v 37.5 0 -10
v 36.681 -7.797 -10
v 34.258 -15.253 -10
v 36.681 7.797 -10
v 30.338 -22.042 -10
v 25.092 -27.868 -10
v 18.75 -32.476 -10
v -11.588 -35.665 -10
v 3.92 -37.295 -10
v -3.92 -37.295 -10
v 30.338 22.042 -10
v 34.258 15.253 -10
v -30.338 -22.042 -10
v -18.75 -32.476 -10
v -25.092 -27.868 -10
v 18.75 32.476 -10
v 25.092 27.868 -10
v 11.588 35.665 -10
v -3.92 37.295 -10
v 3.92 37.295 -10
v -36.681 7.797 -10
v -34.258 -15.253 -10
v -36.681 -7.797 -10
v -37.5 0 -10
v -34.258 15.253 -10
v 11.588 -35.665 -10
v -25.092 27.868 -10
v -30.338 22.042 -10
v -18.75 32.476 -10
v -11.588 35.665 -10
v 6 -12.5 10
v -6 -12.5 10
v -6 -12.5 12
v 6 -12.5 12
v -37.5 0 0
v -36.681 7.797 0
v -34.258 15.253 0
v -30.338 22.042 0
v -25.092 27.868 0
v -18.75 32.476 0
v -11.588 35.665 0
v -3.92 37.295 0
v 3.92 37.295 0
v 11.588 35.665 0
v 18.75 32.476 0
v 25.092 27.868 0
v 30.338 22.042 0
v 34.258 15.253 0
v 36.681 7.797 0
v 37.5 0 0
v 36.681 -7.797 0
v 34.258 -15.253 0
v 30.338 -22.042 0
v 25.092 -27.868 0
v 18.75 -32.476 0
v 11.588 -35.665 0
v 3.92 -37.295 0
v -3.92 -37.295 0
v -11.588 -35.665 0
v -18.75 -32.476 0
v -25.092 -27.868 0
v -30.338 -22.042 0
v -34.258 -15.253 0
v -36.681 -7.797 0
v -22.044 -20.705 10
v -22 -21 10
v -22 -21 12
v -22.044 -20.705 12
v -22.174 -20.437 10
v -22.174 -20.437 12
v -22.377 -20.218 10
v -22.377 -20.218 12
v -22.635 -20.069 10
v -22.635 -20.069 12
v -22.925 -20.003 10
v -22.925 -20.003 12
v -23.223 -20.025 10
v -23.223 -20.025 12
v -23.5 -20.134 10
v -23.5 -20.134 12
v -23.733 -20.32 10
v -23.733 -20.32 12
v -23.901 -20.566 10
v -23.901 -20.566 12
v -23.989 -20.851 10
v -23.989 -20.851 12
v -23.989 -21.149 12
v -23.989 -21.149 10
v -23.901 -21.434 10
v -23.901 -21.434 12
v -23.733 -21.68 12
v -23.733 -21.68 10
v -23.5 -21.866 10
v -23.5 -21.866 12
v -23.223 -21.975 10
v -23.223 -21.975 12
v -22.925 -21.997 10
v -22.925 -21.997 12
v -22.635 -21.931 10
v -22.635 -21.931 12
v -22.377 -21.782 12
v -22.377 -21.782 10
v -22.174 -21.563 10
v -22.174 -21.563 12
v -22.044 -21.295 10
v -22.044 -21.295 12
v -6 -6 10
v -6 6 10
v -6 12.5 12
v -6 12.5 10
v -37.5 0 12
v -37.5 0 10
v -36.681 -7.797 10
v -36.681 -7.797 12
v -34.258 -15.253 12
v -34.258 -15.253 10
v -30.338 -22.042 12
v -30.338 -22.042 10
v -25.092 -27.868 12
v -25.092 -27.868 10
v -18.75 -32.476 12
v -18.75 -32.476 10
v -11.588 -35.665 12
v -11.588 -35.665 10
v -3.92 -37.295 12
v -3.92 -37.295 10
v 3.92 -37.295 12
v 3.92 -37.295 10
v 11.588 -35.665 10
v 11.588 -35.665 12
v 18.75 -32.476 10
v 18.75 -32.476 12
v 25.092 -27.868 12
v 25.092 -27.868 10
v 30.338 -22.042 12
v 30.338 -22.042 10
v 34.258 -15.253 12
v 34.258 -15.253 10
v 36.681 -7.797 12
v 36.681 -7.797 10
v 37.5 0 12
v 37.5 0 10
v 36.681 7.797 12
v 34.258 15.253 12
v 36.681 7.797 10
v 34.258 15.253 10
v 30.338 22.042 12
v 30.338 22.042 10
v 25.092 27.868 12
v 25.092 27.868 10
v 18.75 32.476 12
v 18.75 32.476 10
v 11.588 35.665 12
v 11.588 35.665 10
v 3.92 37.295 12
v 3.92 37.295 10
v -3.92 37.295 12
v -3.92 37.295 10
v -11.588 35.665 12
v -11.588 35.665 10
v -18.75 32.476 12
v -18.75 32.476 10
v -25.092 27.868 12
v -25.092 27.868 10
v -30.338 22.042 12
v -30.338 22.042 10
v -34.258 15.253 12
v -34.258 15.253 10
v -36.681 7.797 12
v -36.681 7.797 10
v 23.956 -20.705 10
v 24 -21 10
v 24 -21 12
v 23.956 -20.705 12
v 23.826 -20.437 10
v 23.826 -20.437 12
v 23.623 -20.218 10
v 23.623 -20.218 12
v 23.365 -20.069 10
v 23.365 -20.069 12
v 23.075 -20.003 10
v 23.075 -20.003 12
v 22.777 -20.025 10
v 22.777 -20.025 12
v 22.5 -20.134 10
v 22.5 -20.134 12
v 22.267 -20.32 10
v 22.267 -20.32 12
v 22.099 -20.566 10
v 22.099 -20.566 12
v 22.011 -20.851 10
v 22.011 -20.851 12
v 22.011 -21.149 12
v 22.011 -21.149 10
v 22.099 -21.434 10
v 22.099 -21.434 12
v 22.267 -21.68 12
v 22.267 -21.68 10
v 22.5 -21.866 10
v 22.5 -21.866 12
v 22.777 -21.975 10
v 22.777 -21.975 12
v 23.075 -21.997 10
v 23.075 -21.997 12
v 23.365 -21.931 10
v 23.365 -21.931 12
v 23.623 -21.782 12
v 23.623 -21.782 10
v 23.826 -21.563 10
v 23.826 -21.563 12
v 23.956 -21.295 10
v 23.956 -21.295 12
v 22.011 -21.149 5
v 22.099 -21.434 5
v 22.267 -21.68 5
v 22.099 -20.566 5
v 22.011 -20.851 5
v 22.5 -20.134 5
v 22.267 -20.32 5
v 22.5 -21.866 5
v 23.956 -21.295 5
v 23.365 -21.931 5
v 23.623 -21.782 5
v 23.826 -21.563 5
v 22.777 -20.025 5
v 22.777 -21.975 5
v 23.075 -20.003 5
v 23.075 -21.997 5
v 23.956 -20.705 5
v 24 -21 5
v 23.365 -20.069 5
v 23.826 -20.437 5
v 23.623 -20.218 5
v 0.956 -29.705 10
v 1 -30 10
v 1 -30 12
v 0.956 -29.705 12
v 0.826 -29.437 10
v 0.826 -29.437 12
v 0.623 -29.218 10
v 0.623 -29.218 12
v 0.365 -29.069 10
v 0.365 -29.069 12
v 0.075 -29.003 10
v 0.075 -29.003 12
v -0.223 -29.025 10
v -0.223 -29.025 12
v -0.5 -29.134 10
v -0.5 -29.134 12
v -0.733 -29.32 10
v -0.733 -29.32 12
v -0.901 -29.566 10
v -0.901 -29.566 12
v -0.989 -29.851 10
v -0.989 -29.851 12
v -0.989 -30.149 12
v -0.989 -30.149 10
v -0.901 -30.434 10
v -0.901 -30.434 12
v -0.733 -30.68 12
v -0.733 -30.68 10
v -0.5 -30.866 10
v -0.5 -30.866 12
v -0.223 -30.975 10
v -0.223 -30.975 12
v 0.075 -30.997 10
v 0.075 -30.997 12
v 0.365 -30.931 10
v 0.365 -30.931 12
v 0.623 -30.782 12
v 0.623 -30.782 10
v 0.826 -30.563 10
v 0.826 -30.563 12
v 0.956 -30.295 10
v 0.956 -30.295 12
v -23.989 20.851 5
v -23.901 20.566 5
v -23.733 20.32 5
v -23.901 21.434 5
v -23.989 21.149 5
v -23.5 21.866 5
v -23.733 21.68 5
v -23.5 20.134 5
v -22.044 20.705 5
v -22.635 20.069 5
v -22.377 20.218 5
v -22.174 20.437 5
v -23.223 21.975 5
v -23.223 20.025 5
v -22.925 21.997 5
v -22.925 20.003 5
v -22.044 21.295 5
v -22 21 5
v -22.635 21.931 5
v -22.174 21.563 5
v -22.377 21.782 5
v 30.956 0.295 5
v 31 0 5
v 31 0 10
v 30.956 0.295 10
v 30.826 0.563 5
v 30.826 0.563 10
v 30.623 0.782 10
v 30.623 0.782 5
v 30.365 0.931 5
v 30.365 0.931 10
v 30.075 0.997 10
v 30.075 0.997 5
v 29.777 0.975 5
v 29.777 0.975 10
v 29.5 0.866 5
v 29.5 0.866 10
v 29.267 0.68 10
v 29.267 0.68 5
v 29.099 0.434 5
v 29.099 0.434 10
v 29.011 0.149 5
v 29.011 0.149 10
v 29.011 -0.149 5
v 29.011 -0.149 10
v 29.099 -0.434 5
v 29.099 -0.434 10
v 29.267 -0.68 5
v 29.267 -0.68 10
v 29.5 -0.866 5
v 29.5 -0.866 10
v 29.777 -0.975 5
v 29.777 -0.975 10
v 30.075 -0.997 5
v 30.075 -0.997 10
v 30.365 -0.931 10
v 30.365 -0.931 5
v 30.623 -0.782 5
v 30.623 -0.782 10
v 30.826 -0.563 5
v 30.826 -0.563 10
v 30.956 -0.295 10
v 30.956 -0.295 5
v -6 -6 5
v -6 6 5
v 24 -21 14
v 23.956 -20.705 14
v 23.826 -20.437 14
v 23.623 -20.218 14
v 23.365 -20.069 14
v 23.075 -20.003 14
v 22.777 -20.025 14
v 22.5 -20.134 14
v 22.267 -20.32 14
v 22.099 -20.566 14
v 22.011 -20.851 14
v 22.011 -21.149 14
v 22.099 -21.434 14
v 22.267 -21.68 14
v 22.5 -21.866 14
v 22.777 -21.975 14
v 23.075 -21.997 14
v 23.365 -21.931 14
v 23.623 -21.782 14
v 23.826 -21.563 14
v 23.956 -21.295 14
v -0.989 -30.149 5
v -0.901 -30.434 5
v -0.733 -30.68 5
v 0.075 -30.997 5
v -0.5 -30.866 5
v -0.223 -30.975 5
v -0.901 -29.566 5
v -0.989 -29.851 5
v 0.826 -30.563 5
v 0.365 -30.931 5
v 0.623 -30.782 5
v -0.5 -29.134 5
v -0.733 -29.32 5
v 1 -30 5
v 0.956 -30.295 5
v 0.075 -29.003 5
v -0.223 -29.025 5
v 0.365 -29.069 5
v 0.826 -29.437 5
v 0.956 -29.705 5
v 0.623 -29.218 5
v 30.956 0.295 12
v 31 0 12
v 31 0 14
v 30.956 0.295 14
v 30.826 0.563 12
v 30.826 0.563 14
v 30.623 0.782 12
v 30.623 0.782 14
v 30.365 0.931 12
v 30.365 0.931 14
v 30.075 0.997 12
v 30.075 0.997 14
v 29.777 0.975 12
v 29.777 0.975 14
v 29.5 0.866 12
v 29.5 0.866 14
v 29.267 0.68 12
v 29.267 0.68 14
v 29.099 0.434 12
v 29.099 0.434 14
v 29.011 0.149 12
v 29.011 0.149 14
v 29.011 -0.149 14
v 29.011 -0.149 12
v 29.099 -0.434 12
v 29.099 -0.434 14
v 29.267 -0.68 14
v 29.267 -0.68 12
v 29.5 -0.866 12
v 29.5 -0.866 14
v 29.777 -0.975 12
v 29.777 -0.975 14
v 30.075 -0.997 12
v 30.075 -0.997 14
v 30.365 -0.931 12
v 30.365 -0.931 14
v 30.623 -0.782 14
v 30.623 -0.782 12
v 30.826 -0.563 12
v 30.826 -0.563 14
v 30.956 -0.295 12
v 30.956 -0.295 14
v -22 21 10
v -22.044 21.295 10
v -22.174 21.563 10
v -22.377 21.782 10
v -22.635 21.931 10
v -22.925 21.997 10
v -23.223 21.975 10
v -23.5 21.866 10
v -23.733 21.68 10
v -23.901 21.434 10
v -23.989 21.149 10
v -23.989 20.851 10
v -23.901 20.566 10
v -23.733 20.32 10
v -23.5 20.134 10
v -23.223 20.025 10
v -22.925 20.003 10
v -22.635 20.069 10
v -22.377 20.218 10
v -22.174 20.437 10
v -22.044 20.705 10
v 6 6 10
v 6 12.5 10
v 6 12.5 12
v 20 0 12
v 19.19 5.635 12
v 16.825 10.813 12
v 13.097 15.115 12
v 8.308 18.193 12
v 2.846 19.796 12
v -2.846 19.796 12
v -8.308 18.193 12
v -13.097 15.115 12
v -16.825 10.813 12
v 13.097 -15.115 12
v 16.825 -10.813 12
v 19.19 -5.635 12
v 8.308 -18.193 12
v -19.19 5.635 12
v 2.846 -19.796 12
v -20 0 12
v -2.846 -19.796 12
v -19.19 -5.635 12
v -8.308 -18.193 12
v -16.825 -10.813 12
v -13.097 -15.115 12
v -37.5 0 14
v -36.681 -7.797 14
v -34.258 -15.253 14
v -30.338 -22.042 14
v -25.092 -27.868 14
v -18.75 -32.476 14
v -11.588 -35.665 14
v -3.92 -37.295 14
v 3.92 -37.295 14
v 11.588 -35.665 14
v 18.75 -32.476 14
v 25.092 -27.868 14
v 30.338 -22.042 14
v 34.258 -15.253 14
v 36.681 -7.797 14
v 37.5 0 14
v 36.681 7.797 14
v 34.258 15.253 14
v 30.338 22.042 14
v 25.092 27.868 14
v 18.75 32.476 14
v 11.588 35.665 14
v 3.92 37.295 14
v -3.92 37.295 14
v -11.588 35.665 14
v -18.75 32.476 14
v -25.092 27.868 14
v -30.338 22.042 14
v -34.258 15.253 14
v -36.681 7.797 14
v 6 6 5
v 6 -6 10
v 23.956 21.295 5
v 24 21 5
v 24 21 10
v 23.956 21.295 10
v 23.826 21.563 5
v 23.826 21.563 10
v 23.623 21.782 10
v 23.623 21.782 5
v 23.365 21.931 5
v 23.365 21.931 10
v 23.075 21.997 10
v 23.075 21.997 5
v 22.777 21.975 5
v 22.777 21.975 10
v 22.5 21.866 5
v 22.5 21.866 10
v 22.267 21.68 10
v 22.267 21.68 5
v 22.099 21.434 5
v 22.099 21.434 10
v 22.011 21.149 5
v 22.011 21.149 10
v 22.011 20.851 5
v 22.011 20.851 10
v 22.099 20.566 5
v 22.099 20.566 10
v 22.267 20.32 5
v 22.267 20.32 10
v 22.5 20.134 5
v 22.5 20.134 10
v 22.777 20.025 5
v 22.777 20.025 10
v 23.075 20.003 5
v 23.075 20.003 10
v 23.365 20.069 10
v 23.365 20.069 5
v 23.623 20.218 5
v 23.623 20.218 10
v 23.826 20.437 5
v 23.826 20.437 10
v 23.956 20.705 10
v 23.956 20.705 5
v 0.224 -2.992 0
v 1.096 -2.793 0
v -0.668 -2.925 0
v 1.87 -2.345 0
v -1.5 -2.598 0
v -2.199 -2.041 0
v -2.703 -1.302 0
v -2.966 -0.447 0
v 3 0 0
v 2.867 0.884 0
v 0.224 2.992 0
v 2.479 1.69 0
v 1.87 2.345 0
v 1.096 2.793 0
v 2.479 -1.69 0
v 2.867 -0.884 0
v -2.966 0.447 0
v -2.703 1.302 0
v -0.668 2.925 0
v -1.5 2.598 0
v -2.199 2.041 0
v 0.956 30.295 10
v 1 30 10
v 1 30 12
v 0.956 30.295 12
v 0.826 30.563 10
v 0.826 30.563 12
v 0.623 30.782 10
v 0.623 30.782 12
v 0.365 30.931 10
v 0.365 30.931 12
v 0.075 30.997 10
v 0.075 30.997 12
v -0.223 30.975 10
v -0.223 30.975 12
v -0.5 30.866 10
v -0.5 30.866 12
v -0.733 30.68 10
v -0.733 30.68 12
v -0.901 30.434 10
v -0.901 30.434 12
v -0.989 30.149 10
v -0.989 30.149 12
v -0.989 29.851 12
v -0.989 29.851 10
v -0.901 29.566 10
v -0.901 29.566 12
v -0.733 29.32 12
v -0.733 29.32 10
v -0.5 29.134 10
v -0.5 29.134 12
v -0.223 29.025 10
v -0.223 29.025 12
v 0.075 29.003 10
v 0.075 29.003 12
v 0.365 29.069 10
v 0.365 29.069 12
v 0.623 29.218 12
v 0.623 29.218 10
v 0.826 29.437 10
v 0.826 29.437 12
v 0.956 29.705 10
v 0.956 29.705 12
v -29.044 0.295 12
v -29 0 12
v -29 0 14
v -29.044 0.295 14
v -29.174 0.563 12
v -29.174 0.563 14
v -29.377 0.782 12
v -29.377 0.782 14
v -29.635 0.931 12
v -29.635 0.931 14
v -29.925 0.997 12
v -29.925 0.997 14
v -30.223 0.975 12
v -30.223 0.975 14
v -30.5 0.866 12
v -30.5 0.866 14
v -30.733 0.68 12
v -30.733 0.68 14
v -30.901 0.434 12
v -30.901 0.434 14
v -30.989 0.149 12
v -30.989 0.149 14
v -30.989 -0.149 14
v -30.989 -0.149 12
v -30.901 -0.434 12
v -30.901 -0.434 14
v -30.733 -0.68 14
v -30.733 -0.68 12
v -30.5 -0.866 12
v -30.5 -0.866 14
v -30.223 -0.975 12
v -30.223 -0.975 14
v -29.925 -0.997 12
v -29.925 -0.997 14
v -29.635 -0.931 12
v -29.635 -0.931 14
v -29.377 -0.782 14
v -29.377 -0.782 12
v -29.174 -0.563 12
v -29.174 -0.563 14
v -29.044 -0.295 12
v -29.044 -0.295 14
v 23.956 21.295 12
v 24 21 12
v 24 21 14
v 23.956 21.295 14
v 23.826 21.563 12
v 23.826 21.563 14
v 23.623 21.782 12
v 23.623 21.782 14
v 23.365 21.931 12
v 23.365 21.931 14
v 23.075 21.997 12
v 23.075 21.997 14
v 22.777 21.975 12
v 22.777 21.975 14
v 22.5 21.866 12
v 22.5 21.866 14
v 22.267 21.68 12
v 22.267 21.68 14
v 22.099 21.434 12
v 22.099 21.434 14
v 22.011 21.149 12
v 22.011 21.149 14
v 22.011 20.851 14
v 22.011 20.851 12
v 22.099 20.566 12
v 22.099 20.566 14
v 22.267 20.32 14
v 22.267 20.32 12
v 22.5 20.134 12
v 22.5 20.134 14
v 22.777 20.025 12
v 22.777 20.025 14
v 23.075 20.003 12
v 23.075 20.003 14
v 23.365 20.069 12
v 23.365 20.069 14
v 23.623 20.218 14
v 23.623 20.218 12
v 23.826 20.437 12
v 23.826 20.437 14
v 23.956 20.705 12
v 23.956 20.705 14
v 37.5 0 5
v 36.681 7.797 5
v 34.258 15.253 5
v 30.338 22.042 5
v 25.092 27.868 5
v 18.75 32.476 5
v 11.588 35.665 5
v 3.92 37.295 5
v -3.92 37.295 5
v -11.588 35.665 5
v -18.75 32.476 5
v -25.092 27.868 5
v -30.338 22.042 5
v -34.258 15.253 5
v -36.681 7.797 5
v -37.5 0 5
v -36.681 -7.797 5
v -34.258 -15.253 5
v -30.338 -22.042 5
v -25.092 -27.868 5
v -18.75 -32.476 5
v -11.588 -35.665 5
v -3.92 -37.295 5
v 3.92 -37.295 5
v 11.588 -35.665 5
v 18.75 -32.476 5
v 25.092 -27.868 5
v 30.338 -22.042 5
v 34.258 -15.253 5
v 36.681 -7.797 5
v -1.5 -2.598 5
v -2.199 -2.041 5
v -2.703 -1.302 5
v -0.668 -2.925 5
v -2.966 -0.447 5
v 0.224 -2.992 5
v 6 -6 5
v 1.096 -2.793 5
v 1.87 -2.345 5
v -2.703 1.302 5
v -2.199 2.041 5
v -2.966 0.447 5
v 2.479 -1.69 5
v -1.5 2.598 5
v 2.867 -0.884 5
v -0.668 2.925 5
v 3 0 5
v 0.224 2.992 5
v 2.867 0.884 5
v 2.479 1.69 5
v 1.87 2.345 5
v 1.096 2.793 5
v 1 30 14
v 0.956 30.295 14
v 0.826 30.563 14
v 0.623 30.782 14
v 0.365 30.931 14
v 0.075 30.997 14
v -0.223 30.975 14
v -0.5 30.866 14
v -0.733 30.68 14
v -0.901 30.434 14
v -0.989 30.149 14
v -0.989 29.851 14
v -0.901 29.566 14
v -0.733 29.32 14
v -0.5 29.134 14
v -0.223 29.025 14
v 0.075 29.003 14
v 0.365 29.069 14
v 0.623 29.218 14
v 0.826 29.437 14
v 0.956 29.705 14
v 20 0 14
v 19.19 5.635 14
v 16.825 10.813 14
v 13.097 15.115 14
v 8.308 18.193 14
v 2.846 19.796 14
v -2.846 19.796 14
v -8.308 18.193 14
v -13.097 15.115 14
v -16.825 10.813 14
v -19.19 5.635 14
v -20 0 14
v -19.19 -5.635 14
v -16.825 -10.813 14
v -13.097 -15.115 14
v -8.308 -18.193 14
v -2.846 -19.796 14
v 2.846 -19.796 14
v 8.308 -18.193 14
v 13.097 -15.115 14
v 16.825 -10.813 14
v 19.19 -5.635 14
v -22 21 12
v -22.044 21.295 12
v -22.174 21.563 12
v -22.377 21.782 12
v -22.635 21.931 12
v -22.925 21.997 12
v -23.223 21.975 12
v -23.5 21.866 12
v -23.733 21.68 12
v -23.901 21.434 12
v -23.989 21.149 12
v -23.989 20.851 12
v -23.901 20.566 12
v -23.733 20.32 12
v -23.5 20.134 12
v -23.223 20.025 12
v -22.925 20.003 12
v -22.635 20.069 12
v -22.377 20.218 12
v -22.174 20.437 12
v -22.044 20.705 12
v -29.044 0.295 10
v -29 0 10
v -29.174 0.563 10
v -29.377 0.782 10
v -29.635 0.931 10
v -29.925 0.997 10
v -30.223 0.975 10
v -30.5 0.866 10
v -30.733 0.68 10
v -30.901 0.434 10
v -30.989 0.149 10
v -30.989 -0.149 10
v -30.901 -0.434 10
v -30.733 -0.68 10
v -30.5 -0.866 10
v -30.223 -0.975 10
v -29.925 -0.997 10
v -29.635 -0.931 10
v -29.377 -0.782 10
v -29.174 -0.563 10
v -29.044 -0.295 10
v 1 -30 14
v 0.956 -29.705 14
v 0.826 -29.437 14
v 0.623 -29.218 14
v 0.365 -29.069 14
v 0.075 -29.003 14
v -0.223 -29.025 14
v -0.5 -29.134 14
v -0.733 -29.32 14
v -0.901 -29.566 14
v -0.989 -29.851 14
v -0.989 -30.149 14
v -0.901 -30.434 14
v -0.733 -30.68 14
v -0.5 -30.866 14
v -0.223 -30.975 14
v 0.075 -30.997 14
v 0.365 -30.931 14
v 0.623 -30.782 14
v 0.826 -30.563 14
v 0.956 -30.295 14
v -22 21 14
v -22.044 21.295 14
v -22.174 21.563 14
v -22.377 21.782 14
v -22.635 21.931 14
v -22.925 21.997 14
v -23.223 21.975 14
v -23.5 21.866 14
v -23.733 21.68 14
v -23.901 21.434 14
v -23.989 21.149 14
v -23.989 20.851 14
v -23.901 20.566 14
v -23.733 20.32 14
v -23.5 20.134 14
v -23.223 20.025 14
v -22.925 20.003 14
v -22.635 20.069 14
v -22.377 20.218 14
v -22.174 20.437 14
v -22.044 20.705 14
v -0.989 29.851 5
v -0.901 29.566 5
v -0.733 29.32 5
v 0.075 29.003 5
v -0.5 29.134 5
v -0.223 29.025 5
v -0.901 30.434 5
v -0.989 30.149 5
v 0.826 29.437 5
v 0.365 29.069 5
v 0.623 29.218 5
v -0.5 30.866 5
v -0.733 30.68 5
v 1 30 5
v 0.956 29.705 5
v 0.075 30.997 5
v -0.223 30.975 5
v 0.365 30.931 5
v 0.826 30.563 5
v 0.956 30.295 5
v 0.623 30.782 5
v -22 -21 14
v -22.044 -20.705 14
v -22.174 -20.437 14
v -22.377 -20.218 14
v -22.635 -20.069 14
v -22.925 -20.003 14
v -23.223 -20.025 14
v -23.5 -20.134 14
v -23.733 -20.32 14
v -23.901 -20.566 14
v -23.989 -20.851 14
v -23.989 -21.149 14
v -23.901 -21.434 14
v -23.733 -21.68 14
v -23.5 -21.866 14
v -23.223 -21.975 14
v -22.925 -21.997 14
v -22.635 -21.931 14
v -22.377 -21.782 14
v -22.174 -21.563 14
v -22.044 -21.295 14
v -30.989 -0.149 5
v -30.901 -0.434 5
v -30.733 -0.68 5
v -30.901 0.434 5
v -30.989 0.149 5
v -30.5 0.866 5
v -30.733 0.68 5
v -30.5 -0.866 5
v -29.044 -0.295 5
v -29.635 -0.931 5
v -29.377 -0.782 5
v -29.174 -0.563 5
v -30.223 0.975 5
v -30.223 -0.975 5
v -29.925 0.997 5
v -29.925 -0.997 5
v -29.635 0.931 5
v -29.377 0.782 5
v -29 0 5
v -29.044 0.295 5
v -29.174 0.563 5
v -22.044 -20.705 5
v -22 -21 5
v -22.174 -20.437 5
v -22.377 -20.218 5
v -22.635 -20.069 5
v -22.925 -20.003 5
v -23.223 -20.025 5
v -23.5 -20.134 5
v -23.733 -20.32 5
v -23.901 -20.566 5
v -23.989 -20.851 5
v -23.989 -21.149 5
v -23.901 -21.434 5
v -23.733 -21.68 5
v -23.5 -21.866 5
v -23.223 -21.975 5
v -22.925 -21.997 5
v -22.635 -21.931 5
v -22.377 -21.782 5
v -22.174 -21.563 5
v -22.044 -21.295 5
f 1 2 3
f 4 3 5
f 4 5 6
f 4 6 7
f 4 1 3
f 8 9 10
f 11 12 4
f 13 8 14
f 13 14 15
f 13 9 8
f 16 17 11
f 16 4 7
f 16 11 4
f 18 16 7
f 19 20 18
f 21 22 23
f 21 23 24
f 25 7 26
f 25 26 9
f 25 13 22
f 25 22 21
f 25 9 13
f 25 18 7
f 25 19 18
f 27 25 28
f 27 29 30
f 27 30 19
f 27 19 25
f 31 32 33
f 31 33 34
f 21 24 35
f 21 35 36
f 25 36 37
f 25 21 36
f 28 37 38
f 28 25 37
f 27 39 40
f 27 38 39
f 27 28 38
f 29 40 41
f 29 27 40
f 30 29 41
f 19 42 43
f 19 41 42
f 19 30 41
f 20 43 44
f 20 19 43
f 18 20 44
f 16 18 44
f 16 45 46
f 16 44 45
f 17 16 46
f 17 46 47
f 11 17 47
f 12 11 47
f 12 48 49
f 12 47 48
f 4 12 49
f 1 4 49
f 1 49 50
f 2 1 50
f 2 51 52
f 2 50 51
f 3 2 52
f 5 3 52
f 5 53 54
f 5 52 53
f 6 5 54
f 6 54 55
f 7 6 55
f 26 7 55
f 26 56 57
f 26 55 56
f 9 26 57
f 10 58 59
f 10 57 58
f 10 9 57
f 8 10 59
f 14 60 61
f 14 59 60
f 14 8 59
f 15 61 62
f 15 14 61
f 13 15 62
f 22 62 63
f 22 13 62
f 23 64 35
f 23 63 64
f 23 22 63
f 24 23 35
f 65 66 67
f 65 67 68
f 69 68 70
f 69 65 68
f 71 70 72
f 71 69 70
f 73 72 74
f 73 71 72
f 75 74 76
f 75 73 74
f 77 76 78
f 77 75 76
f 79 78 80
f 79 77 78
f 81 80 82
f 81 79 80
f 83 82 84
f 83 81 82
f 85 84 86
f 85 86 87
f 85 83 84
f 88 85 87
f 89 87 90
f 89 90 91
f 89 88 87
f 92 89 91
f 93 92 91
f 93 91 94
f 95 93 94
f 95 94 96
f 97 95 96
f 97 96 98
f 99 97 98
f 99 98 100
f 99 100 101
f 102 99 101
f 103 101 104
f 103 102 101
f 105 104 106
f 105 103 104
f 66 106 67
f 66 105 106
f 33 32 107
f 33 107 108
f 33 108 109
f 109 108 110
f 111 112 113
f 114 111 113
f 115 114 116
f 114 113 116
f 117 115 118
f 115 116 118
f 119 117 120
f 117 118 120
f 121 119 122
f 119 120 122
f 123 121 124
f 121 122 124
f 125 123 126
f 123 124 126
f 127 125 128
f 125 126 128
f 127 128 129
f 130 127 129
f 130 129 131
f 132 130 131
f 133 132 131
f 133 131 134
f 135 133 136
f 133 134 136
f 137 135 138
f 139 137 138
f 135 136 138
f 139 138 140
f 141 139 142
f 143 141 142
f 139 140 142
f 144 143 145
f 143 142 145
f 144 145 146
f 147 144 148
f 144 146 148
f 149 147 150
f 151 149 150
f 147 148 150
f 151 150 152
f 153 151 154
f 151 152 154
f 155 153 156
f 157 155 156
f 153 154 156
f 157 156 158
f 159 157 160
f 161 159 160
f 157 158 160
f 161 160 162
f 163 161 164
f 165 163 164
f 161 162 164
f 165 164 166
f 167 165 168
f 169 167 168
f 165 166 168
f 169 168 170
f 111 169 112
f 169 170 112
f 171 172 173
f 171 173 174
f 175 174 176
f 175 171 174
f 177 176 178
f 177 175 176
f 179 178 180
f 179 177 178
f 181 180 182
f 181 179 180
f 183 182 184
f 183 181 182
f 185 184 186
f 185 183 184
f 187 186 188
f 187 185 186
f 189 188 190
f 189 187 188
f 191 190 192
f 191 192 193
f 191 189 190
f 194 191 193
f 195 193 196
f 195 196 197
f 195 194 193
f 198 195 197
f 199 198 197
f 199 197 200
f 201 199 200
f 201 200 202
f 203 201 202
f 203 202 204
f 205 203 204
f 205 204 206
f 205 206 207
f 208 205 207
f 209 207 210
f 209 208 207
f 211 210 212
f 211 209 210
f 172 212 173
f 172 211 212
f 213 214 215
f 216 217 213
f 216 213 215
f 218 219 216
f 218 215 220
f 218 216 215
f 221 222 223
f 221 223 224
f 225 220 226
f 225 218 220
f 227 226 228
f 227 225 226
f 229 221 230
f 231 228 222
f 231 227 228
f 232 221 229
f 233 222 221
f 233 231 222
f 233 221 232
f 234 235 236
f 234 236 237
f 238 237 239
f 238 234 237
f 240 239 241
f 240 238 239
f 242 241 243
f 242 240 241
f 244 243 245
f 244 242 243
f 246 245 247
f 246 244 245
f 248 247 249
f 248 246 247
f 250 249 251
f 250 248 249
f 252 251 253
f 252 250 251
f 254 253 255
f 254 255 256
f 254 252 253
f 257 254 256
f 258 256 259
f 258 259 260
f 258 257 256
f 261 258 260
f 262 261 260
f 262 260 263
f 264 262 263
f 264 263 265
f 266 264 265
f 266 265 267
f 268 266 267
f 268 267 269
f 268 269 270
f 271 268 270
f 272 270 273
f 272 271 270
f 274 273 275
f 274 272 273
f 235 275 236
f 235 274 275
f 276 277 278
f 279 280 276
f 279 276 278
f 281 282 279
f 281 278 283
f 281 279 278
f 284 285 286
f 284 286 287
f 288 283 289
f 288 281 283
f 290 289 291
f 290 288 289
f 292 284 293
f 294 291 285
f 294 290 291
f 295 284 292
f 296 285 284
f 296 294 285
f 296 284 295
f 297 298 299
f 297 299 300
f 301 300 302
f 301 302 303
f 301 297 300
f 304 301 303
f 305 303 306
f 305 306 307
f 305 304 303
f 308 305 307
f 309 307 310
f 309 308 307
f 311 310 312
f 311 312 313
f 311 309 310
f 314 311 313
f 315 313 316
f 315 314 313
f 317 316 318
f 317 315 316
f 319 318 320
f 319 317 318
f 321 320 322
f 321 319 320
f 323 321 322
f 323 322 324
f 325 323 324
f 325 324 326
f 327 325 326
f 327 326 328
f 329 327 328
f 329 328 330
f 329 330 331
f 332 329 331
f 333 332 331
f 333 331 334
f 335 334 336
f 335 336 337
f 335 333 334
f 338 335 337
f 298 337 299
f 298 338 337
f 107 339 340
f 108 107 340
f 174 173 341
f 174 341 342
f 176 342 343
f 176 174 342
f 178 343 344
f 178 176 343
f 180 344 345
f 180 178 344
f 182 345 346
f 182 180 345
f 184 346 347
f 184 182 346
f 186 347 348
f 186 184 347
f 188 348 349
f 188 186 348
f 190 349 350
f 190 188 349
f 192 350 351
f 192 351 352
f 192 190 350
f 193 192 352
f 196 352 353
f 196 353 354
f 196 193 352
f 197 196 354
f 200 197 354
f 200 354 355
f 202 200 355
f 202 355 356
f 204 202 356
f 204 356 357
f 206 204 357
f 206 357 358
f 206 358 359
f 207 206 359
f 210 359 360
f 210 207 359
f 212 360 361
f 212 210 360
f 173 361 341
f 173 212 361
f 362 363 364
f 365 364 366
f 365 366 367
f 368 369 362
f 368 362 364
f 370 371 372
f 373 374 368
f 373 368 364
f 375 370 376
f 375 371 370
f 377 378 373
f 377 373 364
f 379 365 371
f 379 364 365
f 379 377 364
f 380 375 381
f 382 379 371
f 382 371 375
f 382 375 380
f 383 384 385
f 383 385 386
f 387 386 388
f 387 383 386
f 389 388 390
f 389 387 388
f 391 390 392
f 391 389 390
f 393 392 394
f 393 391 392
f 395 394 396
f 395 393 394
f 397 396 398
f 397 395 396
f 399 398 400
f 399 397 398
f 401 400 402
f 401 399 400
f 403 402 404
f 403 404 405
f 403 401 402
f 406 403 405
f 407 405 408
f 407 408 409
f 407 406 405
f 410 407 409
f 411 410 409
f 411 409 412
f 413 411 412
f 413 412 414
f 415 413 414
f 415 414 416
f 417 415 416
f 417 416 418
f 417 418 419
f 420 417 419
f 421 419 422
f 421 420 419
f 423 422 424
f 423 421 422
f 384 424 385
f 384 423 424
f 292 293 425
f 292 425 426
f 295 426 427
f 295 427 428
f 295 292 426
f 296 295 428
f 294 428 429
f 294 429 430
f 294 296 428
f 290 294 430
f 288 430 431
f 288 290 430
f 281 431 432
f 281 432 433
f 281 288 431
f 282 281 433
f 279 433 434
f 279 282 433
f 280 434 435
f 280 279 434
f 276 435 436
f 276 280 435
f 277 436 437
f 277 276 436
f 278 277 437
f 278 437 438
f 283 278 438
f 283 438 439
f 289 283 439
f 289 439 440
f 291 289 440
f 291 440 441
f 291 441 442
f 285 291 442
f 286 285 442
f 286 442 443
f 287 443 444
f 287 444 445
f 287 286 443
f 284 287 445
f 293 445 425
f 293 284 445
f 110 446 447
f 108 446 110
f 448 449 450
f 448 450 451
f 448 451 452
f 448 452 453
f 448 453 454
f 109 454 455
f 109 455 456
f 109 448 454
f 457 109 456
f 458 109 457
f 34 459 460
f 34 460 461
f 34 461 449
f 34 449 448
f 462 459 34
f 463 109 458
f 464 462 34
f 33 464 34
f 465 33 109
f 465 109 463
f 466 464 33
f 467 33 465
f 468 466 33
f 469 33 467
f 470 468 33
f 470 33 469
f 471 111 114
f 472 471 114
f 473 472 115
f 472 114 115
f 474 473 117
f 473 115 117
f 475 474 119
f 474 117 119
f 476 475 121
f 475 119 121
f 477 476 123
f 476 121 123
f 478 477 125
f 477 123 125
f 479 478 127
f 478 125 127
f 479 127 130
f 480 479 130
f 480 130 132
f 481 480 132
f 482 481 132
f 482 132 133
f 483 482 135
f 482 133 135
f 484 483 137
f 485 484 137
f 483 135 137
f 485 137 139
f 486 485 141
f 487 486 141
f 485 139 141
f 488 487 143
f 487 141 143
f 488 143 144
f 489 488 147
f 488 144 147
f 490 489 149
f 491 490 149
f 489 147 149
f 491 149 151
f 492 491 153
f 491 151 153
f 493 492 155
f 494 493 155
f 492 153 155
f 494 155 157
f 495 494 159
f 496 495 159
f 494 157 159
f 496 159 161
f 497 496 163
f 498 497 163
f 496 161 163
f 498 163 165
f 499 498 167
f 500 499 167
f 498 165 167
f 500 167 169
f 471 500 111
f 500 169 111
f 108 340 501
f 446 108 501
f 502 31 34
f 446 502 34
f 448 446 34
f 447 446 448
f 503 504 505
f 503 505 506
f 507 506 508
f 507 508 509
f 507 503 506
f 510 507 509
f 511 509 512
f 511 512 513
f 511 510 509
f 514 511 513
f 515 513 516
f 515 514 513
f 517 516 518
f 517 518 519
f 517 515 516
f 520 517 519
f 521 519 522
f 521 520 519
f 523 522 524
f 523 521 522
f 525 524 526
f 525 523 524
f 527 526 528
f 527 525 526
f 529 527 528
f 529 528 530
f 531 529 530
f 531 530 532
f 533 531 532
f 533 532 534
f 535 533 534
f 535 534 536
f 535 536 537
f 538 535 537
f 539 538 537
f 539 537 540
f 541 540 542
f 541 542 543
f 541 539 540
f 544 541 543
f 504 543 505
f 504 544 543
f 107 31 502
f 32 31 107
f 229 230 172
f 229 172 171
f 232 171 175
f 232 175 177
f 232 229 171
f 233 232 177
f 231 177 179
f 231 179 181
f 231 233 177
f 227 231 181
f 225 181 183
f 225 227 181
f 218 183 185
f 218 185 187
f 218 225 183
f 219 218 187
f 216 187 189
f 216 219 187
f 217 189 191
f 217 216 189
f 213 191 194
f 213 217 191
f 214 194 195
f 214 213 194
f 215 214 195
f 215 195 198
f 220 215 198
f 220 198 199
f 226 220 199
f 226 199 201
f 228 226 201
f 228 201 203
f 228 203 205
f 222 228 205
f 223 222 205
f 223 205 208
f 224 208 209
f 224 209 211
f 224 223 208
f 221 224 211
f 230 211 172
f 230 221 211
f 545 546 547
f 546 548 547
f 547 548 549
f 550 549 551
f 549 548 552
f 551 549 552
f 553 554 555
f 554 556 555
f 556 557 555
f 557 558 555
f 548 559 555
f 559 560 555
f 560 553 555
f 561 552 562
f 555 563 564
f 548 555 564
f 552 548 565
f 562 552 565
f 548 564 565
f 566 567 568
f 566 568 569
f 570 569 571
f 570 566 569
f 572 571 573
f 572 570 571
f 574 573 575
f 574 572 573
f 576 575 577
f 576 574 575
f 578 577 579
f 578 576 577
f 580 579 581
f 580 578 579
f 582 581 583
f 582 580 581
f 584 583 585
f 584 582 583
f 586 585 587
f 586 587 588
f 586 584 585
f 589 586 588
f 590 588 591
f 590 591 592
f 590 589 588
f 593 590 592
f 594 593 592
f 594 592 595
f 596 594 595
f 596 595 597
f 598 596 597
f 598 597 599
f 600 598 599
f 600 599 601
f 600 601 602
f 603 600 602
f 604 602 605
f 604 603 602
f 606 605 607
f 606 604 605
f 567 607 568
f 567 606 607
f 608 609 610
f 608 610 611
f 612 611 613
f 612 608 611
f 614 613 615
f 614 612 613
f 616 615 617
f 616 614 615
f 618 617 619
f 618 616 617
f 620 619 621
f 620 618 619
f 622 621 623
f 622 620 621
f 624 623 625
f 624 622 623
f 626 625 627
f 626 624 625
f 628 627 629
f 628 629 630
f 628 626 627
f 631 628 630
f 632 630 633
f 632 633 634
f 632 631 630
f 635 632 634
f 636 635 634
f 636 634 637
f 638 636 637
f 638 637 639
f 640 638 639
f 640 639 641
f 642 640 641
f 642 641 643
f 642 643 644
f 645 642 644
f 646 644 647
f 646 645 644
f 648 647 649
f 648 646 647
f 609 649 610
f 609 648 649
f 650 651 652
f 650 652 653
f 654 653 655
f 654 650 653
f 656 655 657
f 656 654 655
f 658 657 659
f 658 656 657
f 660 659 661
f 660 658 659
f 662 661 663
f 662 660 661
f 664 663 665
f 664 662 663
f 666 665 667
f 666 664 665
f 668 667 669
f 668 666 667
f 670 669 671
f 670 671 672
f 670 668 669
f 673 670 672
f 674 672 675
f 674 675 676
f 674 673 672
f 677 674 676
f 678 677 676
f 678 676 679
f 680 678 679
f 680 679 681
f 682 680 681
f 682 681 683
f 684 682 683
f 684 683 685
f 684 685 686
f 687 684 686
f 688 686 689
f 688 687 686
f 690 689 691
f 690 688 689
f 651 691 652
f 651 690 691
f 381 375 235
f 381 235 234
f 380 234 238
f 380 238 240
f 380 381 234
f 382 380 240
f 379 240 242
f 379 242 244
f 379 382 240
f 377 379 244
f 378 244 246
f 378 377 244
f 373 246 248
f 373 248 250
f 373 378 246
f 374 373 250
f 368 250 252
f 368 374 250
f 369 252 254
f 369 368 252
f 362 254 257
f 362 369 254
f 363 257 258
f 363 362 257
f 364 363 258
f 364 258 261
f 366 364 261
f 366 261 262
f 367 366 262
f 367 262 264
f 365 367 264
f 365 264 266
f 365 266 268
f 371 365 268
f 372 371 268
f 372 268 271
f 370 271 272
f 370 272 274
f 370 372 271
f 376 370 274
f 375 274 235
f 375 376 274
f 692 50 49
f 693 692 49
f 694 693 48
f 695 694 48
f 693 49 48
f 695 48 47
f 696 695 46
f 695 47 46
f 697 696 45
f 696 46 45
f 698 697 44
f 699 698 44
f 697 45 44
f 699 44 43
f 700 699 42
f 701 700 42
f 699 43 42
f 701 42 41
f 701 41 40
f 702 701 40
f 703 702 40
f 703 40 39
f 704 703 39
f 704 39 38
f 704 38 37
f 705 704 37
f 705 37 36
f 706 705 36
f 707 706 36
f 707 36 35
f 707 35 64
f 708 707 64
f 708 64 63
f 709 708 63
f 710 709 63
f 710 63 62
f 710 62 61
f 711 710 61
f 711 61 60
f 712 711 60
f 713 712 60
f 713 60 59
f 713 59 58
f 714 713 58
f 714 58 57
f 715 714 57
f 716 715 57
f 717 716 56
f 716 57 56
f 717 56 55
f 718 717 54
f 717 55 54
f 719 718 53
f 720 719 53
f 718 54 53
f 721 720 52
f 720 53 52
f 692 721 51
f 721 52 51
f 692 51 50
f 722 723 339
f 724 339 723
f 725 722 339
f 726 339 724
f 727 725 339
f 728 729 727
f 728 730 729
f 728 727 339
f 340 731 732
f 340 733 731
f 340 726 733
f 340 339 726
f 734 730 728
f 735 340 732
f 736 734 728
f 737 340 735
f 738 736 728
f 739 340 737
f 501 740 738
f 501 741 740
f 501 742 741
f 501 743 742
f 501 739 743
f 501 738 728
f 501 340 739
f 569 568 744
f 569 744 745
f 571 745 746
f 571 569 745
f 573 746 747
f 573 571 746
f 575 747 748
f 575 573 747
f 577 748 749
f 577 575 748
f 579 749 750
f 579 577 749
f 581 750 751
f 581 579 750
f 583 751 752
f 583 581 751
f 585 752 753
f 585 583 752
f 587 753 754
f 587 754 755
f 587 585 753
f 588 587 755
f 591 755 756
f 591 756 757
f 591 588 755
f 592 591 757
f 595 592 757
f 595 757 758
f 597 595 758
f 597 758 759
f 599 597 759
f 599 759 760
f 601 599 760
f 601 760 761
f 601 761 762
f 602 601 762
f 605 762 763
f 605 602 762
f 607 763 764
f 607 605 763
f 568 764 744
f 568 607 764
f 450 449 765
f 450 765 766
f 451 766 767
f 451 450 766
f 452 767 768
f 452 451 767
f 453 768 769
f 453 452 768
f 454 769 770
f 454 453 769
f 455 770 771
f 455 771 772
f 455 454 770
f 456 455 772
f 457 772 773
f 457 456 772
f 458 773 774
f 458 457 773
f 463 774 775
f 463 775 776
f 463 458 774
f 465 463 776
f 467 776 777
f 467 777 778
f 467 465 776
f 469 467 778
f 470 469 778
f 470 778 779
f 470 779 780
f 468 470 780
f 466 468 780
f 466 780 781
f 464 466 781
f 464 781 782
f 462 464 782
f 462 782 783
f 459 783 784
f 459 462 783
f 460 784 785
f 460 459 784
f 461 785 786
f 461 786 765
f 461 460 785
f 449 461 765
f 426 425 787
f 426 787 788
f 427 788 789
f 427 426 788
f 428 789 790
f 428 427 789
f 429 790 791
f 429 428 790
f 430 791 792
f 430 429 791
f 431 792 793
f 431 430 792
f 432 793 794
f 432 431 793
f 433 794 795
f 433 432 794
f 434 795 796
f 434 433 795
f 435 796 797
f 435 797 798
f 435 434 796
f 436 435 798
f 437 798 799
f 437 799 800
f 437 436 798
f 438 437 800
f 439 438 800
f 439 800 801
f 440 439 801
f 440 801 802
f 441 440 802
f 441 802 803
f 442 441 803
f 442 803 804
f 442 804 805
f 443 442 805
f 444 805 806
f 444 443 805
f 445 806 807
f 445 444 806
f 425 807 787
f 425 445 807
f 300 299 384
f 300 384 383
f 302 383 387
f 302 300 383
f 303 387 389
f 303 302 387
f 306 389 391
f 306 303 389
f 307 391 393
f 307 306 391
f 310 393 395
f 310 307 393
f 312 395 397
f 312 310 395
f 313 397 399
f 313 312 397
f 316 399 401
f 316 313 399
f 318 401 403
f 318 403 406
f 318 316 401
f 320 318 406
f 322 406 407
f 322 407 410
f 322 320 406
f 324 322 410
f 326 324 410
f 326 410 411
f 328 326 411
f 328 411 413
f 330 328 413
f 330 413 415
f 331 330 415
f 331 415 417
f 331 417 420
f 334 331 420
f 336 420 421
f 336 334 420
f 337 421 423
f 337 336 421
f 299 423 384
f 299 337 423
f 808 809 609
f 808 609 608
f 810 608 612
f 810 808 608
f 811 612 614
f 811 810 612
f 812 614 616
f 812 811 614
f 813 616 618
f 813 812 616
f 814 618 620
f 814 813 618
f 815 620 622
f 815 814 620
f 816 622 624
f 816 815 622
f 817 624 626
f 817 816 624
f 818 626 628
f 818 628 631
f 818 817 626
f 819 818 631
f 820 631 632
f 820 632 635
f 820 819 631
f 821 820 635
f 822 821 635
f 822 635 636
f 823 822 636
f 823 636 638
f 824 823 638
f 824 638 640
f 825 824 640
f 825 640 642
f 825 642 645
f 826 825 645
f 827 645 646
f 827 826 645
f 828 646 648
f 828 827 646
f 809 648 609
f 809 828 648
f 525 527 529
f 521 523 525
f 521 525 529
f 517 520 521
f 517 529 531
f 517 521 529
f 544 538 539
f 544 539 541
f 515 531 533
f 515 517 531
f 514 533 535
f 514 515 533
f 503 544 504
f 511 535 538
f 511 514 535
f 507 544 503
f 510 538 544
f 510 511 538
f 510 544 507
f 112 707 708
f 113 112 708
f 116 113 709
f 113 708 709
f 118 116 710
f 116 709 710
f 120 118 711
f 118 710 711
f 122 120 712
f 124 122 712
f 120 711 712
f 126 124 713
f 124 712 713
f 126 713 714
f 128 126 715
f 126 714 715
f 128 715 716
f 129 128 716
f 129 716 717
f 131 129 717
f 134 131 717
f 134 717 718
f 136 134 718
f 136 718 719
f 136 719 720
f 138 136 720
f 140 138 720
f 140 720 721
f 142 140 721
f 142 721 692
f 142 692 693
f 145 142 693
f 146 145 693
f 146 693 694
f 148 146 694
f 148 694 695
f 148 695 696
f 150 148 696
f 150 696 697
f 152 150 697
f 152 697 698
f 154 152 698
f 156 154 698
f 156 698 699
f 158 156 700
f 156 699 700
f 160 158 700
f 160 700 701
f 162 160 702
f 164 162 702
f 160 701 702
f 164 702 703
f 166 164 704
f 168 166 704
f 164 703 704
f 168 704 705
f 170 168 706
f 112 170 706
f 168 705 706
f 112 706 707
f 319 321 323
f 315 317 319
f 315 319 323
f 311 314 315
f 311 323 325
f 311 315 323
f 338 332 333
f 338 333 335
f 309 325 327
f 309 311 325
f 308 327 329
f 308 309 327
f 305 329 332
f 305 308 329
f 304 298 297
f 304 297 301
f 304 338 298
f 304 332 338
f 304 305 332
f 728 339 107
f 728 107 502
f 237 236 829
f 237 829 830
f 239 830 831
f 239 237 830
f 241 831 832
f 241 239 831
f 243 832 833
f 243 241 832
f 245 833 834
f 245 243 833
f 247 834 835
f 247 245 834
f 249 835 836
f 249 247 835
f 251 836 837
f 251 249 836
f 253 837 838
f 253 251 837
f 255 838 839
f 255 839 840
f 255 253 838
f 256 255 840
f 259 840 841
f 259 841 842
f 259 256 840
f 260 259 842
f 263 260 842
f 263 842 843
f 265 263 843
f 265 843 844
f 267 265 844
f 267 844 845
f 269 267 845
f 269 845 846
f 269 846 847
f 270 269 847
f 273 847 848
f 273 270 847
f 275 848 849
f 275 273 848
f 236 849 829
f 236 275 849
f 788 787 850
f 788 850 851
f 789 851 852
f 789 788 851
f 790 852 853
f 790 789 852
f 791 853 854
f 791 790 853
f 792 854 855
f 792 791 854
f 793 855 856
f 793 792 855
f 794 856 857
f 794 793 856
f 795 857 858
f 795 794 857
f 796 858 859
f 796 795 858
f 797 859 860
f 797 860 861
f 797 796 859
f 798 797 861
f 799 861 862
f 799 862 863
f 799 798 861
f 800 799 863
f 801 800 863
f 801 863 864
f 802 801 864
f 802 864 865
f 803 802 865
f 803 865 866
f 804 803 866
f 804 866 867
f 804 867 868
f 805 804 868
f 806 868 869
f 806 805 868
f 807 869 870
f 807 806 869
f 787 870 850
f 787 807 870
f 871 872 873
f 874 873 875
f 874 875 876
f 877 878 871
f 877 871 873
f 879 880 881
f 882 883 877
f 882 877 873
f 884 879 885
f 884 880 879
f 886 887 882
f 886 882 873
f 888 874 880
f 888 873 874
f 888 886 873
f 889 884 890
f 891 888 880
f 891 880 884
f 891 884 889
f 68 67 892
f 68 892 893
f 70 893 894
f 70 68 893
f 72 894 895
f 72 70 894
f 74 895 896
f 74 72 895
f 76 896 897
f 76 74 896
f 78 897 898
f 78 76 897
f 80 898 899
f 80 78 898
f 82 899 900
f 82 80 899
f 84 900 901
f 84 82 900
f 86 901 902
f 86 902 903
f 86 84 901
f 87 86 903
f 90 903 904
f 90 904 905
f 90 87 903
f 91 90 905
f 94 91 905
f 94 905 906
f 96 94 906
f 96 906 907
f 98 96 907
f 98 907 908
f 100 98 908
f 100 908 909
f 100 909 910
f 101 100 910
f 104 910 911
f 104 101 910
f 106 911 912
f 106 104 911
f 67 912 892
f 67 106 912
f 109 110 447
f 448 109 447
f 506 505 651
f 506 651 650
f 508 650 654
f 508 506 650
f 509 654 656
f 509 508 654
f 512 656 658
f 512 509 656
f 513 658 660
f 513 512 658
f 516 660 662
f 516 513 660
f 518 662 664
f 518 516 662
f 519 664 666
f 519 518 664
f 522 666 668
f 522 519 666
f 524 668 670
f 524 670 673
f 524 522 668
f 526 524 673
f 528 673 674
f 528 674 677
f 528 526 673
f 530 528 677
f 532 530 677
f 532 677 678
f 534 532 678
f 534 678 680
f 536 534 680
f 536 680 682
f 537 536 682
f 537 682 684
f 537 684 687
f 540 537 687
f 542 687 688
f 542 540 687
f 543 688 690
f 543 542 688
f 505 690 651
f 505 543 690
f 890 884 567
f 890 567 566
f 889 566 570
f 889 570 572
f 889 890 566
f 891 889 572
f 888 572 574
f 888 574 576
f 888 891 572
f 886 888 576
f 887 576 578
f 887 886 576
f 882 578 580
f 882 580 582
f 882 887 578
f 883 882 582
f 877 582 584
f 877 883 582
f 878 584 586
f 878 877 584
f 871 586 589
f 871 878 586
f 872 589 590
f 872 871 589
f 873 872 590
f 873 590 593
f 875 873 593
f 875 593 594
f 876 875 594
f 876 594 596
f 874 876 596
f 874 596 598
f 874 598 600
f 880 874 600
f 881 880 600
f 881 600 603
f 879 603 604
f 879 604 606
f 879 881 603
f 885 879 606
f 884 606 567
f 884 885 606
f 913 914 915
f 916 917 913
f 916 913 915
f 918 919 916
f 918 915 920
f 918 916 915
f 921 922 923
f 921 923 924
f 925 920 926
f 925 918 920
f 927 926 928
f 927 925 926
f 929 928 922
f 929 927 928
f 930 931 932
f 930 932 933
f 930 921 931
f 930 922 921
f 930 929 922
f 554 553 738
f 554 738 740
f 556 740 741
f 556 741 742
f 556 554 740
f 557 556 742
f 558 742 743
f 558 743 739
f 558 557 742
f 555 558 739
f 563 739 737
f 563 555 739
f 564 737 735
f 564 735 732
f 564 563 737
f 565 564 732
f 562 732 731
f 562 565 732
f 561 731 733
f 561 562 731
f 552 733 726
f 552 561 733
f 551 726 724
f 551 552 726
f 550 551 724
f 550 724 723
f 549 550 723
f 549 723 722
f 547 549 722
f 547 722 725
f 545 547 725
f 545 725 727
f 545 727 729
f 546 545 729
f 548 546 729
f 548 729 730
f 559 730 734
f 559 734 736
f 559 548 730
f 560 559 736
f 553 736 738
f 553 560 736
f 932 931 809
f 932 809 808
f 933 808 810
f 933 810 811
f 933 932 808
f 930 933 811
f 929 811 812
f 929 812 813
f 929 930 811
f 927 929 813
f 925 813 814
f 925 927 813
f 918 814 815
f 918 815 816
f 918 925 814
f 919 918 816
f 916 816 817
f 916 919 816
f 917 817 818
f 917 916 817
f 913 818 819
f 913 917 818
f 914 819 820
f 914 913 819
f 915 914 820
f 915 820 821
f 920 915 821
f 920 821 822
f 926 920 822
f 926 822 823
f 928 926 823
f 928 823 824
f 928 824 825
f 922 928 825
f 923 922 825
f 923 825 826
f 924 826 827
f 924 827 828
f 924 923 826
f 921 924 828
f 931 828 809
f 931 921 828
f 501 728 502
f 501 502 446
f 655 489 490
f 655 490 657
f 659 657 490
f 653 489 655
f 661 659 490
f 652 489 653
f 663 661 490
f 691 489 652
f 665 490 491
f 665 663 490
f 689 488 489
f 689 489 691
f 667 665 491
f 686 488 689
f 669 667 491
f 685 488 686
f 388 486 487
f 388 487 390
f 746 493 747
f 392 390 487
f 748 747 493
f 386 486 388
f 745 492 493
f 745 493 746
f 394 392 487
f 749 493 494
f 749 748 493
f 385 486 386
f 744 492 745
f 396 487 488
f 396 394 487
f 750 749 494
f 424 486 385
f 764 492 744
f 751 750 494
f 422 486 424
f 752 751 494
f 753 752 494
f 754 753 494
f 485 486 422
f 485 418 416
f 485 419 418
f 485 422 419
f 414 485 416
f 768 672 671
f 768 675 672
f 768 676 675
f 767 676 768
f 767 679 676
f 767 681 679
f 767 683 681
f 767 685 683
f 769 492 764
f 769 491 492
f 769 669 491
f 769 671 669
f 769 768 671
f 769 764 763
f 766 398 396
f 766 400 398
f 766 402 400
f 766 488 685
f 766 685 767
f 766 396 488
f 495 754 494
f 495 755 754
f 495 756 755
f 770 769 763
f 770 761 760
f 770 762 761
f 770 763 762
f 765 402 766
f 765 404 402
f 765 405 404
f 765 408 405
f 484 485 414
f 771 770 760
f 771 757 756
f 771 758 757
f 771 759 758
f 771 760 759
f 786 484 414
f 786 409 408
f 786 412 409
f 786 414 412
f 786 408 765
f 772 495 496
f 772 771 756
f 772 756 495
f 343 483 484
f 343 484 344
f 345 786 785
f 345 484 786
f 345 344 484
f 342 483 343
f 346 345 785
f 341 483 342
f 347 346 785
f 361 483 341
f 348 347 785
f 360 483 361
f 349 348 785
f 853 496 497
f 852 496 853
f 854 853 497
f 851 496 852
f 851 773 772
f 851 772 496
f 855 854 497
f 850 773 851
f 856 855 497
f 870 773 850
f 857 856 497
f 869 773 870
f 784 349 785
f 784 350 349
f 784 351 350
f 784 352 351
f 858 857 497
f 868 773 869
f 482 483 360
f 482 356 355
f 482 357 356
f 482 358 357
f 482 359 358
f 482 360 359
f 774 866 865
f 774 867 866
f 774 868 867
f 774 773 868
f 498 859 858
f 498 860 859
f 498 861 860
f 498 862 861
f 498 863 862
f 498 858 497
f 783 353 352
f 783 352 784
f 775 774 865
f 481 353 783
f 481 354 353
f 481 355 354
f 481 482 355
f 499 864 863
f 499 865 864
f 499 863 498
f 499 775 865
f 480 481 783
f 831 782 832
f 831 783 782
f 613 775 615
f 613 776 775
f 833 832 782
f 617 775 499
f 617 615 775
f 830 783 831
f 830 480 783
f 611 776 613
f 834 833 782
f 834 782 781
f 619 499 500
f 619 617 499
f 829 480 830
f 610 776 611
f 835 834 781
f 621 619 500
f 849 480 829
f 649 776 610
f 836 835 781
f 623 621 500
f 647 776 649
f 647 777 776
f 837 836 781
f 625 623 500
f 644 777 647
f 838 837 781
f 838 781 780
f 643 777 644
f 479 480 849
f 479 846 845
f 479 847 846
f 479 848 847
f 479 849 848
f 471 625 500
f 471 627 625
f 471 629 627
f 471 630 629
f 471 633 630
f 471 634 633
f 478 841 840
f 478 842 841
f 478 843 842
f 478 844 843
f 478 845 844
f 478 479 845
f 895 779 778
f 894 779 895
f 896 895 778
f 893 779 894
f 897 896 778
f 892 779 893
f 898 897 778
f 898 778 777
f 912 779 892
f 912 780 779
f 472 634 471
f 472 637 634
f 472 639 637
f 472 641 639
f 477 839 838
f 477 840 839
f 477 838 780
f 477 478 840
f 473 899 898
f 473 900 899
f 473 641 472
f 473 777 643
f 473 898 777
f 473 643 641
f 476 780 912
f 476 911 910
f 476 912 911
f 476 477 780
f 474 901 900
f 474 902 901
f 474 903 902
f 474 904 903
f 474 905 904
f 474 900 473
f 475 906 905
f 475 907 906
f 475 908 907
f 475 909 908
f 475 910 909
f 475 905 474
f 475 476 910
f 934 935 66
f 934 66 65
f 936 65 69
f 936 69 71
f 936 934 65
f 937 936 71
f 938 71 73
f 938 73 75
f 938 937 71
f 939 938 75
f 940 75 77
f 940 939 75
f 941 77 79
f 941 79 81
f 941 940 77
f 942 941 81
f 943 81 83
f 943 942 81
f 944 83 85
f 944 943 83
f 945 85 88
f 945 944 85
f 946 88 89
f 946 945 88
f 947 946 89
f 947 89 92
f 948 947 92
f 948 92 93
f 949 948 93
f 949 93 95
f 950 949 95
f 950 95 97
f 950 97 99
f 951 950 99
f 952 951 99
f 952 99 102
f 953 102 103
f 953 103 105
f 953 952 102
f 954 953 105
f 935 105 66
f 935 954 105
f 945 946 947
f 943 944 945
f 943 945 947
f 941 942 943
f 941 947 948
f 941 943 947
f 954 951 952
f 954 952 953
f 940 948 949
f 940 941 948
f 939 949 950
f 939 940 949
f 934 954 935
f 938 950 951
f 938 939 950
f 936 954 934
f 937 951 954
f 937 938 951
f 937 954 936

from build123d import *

# Parameters (mm, degrees)
SKETCH_1_R      = 37.5
SKETCH_1_R_2    = 3
EXTRUDE_1_DEPTH = 5
EXTRUDE_START   = 10
SKETCH_2_R      = 37.5
EXTRUDE_2_DEPTH = 10
SKETCH_3_R      = 37.5
SKETCH_3_R_2    = 1
SKETCH_3_W      = 12
SKETCH_3_H      = 12
EXTRUDE_3_DEPTH = 5
SKETCH_4_R      = 37.5
SKETCH_4_R_2    = 1
SKETCH_4_W      = 12
SKETCH_4_H      = 25
EXTRUDE_4_DEPTH = 2
SKETCH_5_R      = 37.5
SKETCH_5_R_2    = 20
SKETCH_5_R_3    = 1
EXTRUDE_5_DEPTH = 2


with BuildPart() as part:
    # Эскиз1 → Бобышка-Вытянуть1 (new body)
    with BuildSketch(Plane.XY):
        Circle(SKETCH_1_R)
        Circle(SKETCH_1_R_2, mode=Mode.SUBTRACT)
    extrude(amount=EXTRUDE_1_DEPTH)

    # Эскиз2 → Бобышка-Вытянуть2 (add)
    with BuildSketch(Plane(origin=(0, 0, 0), x_dir=(-1, 0, 0), z_dir=(0, 0, -1)).offset(EXTRUDE_START)):
        Circle(SKETCH_2_R)
    extrude(amount=-EXTRUDE_2_DEPTH)

    # Эскиз3 → Бобышка-Вытянуть3 (add)
    with BuildSketch(Plane.XY.offset(5)):
        with Locations(Location((0, 0, 0), (0, 0, 180))):
            Circle(SKETCH_3_R)
        with Locations((0, 30)):
            Circle(SKETCH_3_R_2, mode=Mode.SUBTRACT)
        with Locations((0, -30)):
            Circle(SKETCH_3_R_2, mode=Mode.SUBTRACT)
        with Locations((-30, 0)):
            Circle(SKETCH_3_R_2, mode=Mode.SUBTRACT)
        with Locations((30, 0)):
            Circle(SKETCH_3_R_2, mode=Mode.SUBTRACT)
        with Locations((-23, 21)):
            Circle(SKETCH_3_R_2, mode=Mode.SUBTRACT)
        with Locations((-23, -21)):
            Circle(SKETCH_3_R_2, mode=Mode.SUBTRACT)
        with Locations((23, -21)):
            Circle(SKETCH_3_R_2, mode=Mode.SUBTRACT)
        with Locations((23, 21)):
            Circle(SKETCH_3_R_2, mode=Mode.SUBTRACT)
        Rectangle(SKETCH_3_W, SKETCH_3_H, mode=Mode.SUBTRACT)
    extrude(amount=EXTRUDE_3_DEPTH)

    # Эскиз4 → Бобышка-Вытянуть4 (add)
    with BuildSketch(Plane.XY.offset(10)):
        with Locations(Location((0, 0, 0), (0, 0, 180))):
            Circle(SKETCH_4_R)
        with Locations((0, 30)):
            Circle(SKETCH_4_R_2, mode=Mode.SUBTRACT)
        with Locations((0, -30)):
            Circle(SKETCH_4_R_2, mode=Mode.SUBTRACT)
        with Locations((-30, 0)):
            Circle(SKETCH_4_R_2, mode=Mode.SUBTRACT)
        with Locations((30, 0)):
            Circle(SKETCH_4_R_2, mode=Mode.SUBTRACT)
        with Locations((-23, -21)):
            Circle(SKETCH_4_R_2, mode=Mode.SUBTRACT)
        with Locations((23, -21)):
            Circle(SKETCH_4_R_2, mode=Mode.SUBTRACT)
        with Locations((-23, 21)):
            Circle(SKETCH_4_R_2, mode=Mode.SUBTRACT)
        with Locations((23, 21)):
            Circle(SKETCH_4_R_2, mode=Mode.SUBTRACT)
        Rectangle(SKETCH_4_W, SKETCH_4_H, mode=Mode.SUBTRACT)
    extrude(amount=EXTRUDE_4_DEPTH)

    # Эскиз5 → Бобышка-Вытянуть5 (add)
    with BuildSketch(Plane.XY.offset(12)):
        with Locations(Location((0, 0, 0), (0, 0, 180))):
            Circle(SKETCH_5_R)
        Circle(SKETCH_5_R_2, mode=Mode.SUBTRACT)
        with Locations((0, 30)):
            Circle(SKETCH_5_R_3, mode=Mode.SUBTRACT)
        with Locations((0, -30)):
            Circle(SKETCH_5_R_3, mode=Mode.SUBTRACT)
        with Locations((-30, 0)):
            Circle(SKETCH_5_R_3, mode=Mode.SUBTRACT)
        with Locations((30, 0)):
            Circle(SKETCH_5_R_3, mode=Mode.SUBTRACT)
        with Locations((-23, 21)):
            Circle(SKETCH_5_R_3, mode=Mode.SUBTRACT)
        with Locations((23, 21)):
            Circle(SKETCH_5_R_3, mode=Mode.SUBTRACT)
        with Locations((-23, -21)):
            Circle(SKETCH_5_R_3, mode=Mode.SUBTRACT)
        with Locations((23, -21)):
            Circle(SKETCH_5_R_3, mode=Mode.SUBTRACT)
    extrude(amount=EXTRUDE_5_DEPTH)


solid = part.part
